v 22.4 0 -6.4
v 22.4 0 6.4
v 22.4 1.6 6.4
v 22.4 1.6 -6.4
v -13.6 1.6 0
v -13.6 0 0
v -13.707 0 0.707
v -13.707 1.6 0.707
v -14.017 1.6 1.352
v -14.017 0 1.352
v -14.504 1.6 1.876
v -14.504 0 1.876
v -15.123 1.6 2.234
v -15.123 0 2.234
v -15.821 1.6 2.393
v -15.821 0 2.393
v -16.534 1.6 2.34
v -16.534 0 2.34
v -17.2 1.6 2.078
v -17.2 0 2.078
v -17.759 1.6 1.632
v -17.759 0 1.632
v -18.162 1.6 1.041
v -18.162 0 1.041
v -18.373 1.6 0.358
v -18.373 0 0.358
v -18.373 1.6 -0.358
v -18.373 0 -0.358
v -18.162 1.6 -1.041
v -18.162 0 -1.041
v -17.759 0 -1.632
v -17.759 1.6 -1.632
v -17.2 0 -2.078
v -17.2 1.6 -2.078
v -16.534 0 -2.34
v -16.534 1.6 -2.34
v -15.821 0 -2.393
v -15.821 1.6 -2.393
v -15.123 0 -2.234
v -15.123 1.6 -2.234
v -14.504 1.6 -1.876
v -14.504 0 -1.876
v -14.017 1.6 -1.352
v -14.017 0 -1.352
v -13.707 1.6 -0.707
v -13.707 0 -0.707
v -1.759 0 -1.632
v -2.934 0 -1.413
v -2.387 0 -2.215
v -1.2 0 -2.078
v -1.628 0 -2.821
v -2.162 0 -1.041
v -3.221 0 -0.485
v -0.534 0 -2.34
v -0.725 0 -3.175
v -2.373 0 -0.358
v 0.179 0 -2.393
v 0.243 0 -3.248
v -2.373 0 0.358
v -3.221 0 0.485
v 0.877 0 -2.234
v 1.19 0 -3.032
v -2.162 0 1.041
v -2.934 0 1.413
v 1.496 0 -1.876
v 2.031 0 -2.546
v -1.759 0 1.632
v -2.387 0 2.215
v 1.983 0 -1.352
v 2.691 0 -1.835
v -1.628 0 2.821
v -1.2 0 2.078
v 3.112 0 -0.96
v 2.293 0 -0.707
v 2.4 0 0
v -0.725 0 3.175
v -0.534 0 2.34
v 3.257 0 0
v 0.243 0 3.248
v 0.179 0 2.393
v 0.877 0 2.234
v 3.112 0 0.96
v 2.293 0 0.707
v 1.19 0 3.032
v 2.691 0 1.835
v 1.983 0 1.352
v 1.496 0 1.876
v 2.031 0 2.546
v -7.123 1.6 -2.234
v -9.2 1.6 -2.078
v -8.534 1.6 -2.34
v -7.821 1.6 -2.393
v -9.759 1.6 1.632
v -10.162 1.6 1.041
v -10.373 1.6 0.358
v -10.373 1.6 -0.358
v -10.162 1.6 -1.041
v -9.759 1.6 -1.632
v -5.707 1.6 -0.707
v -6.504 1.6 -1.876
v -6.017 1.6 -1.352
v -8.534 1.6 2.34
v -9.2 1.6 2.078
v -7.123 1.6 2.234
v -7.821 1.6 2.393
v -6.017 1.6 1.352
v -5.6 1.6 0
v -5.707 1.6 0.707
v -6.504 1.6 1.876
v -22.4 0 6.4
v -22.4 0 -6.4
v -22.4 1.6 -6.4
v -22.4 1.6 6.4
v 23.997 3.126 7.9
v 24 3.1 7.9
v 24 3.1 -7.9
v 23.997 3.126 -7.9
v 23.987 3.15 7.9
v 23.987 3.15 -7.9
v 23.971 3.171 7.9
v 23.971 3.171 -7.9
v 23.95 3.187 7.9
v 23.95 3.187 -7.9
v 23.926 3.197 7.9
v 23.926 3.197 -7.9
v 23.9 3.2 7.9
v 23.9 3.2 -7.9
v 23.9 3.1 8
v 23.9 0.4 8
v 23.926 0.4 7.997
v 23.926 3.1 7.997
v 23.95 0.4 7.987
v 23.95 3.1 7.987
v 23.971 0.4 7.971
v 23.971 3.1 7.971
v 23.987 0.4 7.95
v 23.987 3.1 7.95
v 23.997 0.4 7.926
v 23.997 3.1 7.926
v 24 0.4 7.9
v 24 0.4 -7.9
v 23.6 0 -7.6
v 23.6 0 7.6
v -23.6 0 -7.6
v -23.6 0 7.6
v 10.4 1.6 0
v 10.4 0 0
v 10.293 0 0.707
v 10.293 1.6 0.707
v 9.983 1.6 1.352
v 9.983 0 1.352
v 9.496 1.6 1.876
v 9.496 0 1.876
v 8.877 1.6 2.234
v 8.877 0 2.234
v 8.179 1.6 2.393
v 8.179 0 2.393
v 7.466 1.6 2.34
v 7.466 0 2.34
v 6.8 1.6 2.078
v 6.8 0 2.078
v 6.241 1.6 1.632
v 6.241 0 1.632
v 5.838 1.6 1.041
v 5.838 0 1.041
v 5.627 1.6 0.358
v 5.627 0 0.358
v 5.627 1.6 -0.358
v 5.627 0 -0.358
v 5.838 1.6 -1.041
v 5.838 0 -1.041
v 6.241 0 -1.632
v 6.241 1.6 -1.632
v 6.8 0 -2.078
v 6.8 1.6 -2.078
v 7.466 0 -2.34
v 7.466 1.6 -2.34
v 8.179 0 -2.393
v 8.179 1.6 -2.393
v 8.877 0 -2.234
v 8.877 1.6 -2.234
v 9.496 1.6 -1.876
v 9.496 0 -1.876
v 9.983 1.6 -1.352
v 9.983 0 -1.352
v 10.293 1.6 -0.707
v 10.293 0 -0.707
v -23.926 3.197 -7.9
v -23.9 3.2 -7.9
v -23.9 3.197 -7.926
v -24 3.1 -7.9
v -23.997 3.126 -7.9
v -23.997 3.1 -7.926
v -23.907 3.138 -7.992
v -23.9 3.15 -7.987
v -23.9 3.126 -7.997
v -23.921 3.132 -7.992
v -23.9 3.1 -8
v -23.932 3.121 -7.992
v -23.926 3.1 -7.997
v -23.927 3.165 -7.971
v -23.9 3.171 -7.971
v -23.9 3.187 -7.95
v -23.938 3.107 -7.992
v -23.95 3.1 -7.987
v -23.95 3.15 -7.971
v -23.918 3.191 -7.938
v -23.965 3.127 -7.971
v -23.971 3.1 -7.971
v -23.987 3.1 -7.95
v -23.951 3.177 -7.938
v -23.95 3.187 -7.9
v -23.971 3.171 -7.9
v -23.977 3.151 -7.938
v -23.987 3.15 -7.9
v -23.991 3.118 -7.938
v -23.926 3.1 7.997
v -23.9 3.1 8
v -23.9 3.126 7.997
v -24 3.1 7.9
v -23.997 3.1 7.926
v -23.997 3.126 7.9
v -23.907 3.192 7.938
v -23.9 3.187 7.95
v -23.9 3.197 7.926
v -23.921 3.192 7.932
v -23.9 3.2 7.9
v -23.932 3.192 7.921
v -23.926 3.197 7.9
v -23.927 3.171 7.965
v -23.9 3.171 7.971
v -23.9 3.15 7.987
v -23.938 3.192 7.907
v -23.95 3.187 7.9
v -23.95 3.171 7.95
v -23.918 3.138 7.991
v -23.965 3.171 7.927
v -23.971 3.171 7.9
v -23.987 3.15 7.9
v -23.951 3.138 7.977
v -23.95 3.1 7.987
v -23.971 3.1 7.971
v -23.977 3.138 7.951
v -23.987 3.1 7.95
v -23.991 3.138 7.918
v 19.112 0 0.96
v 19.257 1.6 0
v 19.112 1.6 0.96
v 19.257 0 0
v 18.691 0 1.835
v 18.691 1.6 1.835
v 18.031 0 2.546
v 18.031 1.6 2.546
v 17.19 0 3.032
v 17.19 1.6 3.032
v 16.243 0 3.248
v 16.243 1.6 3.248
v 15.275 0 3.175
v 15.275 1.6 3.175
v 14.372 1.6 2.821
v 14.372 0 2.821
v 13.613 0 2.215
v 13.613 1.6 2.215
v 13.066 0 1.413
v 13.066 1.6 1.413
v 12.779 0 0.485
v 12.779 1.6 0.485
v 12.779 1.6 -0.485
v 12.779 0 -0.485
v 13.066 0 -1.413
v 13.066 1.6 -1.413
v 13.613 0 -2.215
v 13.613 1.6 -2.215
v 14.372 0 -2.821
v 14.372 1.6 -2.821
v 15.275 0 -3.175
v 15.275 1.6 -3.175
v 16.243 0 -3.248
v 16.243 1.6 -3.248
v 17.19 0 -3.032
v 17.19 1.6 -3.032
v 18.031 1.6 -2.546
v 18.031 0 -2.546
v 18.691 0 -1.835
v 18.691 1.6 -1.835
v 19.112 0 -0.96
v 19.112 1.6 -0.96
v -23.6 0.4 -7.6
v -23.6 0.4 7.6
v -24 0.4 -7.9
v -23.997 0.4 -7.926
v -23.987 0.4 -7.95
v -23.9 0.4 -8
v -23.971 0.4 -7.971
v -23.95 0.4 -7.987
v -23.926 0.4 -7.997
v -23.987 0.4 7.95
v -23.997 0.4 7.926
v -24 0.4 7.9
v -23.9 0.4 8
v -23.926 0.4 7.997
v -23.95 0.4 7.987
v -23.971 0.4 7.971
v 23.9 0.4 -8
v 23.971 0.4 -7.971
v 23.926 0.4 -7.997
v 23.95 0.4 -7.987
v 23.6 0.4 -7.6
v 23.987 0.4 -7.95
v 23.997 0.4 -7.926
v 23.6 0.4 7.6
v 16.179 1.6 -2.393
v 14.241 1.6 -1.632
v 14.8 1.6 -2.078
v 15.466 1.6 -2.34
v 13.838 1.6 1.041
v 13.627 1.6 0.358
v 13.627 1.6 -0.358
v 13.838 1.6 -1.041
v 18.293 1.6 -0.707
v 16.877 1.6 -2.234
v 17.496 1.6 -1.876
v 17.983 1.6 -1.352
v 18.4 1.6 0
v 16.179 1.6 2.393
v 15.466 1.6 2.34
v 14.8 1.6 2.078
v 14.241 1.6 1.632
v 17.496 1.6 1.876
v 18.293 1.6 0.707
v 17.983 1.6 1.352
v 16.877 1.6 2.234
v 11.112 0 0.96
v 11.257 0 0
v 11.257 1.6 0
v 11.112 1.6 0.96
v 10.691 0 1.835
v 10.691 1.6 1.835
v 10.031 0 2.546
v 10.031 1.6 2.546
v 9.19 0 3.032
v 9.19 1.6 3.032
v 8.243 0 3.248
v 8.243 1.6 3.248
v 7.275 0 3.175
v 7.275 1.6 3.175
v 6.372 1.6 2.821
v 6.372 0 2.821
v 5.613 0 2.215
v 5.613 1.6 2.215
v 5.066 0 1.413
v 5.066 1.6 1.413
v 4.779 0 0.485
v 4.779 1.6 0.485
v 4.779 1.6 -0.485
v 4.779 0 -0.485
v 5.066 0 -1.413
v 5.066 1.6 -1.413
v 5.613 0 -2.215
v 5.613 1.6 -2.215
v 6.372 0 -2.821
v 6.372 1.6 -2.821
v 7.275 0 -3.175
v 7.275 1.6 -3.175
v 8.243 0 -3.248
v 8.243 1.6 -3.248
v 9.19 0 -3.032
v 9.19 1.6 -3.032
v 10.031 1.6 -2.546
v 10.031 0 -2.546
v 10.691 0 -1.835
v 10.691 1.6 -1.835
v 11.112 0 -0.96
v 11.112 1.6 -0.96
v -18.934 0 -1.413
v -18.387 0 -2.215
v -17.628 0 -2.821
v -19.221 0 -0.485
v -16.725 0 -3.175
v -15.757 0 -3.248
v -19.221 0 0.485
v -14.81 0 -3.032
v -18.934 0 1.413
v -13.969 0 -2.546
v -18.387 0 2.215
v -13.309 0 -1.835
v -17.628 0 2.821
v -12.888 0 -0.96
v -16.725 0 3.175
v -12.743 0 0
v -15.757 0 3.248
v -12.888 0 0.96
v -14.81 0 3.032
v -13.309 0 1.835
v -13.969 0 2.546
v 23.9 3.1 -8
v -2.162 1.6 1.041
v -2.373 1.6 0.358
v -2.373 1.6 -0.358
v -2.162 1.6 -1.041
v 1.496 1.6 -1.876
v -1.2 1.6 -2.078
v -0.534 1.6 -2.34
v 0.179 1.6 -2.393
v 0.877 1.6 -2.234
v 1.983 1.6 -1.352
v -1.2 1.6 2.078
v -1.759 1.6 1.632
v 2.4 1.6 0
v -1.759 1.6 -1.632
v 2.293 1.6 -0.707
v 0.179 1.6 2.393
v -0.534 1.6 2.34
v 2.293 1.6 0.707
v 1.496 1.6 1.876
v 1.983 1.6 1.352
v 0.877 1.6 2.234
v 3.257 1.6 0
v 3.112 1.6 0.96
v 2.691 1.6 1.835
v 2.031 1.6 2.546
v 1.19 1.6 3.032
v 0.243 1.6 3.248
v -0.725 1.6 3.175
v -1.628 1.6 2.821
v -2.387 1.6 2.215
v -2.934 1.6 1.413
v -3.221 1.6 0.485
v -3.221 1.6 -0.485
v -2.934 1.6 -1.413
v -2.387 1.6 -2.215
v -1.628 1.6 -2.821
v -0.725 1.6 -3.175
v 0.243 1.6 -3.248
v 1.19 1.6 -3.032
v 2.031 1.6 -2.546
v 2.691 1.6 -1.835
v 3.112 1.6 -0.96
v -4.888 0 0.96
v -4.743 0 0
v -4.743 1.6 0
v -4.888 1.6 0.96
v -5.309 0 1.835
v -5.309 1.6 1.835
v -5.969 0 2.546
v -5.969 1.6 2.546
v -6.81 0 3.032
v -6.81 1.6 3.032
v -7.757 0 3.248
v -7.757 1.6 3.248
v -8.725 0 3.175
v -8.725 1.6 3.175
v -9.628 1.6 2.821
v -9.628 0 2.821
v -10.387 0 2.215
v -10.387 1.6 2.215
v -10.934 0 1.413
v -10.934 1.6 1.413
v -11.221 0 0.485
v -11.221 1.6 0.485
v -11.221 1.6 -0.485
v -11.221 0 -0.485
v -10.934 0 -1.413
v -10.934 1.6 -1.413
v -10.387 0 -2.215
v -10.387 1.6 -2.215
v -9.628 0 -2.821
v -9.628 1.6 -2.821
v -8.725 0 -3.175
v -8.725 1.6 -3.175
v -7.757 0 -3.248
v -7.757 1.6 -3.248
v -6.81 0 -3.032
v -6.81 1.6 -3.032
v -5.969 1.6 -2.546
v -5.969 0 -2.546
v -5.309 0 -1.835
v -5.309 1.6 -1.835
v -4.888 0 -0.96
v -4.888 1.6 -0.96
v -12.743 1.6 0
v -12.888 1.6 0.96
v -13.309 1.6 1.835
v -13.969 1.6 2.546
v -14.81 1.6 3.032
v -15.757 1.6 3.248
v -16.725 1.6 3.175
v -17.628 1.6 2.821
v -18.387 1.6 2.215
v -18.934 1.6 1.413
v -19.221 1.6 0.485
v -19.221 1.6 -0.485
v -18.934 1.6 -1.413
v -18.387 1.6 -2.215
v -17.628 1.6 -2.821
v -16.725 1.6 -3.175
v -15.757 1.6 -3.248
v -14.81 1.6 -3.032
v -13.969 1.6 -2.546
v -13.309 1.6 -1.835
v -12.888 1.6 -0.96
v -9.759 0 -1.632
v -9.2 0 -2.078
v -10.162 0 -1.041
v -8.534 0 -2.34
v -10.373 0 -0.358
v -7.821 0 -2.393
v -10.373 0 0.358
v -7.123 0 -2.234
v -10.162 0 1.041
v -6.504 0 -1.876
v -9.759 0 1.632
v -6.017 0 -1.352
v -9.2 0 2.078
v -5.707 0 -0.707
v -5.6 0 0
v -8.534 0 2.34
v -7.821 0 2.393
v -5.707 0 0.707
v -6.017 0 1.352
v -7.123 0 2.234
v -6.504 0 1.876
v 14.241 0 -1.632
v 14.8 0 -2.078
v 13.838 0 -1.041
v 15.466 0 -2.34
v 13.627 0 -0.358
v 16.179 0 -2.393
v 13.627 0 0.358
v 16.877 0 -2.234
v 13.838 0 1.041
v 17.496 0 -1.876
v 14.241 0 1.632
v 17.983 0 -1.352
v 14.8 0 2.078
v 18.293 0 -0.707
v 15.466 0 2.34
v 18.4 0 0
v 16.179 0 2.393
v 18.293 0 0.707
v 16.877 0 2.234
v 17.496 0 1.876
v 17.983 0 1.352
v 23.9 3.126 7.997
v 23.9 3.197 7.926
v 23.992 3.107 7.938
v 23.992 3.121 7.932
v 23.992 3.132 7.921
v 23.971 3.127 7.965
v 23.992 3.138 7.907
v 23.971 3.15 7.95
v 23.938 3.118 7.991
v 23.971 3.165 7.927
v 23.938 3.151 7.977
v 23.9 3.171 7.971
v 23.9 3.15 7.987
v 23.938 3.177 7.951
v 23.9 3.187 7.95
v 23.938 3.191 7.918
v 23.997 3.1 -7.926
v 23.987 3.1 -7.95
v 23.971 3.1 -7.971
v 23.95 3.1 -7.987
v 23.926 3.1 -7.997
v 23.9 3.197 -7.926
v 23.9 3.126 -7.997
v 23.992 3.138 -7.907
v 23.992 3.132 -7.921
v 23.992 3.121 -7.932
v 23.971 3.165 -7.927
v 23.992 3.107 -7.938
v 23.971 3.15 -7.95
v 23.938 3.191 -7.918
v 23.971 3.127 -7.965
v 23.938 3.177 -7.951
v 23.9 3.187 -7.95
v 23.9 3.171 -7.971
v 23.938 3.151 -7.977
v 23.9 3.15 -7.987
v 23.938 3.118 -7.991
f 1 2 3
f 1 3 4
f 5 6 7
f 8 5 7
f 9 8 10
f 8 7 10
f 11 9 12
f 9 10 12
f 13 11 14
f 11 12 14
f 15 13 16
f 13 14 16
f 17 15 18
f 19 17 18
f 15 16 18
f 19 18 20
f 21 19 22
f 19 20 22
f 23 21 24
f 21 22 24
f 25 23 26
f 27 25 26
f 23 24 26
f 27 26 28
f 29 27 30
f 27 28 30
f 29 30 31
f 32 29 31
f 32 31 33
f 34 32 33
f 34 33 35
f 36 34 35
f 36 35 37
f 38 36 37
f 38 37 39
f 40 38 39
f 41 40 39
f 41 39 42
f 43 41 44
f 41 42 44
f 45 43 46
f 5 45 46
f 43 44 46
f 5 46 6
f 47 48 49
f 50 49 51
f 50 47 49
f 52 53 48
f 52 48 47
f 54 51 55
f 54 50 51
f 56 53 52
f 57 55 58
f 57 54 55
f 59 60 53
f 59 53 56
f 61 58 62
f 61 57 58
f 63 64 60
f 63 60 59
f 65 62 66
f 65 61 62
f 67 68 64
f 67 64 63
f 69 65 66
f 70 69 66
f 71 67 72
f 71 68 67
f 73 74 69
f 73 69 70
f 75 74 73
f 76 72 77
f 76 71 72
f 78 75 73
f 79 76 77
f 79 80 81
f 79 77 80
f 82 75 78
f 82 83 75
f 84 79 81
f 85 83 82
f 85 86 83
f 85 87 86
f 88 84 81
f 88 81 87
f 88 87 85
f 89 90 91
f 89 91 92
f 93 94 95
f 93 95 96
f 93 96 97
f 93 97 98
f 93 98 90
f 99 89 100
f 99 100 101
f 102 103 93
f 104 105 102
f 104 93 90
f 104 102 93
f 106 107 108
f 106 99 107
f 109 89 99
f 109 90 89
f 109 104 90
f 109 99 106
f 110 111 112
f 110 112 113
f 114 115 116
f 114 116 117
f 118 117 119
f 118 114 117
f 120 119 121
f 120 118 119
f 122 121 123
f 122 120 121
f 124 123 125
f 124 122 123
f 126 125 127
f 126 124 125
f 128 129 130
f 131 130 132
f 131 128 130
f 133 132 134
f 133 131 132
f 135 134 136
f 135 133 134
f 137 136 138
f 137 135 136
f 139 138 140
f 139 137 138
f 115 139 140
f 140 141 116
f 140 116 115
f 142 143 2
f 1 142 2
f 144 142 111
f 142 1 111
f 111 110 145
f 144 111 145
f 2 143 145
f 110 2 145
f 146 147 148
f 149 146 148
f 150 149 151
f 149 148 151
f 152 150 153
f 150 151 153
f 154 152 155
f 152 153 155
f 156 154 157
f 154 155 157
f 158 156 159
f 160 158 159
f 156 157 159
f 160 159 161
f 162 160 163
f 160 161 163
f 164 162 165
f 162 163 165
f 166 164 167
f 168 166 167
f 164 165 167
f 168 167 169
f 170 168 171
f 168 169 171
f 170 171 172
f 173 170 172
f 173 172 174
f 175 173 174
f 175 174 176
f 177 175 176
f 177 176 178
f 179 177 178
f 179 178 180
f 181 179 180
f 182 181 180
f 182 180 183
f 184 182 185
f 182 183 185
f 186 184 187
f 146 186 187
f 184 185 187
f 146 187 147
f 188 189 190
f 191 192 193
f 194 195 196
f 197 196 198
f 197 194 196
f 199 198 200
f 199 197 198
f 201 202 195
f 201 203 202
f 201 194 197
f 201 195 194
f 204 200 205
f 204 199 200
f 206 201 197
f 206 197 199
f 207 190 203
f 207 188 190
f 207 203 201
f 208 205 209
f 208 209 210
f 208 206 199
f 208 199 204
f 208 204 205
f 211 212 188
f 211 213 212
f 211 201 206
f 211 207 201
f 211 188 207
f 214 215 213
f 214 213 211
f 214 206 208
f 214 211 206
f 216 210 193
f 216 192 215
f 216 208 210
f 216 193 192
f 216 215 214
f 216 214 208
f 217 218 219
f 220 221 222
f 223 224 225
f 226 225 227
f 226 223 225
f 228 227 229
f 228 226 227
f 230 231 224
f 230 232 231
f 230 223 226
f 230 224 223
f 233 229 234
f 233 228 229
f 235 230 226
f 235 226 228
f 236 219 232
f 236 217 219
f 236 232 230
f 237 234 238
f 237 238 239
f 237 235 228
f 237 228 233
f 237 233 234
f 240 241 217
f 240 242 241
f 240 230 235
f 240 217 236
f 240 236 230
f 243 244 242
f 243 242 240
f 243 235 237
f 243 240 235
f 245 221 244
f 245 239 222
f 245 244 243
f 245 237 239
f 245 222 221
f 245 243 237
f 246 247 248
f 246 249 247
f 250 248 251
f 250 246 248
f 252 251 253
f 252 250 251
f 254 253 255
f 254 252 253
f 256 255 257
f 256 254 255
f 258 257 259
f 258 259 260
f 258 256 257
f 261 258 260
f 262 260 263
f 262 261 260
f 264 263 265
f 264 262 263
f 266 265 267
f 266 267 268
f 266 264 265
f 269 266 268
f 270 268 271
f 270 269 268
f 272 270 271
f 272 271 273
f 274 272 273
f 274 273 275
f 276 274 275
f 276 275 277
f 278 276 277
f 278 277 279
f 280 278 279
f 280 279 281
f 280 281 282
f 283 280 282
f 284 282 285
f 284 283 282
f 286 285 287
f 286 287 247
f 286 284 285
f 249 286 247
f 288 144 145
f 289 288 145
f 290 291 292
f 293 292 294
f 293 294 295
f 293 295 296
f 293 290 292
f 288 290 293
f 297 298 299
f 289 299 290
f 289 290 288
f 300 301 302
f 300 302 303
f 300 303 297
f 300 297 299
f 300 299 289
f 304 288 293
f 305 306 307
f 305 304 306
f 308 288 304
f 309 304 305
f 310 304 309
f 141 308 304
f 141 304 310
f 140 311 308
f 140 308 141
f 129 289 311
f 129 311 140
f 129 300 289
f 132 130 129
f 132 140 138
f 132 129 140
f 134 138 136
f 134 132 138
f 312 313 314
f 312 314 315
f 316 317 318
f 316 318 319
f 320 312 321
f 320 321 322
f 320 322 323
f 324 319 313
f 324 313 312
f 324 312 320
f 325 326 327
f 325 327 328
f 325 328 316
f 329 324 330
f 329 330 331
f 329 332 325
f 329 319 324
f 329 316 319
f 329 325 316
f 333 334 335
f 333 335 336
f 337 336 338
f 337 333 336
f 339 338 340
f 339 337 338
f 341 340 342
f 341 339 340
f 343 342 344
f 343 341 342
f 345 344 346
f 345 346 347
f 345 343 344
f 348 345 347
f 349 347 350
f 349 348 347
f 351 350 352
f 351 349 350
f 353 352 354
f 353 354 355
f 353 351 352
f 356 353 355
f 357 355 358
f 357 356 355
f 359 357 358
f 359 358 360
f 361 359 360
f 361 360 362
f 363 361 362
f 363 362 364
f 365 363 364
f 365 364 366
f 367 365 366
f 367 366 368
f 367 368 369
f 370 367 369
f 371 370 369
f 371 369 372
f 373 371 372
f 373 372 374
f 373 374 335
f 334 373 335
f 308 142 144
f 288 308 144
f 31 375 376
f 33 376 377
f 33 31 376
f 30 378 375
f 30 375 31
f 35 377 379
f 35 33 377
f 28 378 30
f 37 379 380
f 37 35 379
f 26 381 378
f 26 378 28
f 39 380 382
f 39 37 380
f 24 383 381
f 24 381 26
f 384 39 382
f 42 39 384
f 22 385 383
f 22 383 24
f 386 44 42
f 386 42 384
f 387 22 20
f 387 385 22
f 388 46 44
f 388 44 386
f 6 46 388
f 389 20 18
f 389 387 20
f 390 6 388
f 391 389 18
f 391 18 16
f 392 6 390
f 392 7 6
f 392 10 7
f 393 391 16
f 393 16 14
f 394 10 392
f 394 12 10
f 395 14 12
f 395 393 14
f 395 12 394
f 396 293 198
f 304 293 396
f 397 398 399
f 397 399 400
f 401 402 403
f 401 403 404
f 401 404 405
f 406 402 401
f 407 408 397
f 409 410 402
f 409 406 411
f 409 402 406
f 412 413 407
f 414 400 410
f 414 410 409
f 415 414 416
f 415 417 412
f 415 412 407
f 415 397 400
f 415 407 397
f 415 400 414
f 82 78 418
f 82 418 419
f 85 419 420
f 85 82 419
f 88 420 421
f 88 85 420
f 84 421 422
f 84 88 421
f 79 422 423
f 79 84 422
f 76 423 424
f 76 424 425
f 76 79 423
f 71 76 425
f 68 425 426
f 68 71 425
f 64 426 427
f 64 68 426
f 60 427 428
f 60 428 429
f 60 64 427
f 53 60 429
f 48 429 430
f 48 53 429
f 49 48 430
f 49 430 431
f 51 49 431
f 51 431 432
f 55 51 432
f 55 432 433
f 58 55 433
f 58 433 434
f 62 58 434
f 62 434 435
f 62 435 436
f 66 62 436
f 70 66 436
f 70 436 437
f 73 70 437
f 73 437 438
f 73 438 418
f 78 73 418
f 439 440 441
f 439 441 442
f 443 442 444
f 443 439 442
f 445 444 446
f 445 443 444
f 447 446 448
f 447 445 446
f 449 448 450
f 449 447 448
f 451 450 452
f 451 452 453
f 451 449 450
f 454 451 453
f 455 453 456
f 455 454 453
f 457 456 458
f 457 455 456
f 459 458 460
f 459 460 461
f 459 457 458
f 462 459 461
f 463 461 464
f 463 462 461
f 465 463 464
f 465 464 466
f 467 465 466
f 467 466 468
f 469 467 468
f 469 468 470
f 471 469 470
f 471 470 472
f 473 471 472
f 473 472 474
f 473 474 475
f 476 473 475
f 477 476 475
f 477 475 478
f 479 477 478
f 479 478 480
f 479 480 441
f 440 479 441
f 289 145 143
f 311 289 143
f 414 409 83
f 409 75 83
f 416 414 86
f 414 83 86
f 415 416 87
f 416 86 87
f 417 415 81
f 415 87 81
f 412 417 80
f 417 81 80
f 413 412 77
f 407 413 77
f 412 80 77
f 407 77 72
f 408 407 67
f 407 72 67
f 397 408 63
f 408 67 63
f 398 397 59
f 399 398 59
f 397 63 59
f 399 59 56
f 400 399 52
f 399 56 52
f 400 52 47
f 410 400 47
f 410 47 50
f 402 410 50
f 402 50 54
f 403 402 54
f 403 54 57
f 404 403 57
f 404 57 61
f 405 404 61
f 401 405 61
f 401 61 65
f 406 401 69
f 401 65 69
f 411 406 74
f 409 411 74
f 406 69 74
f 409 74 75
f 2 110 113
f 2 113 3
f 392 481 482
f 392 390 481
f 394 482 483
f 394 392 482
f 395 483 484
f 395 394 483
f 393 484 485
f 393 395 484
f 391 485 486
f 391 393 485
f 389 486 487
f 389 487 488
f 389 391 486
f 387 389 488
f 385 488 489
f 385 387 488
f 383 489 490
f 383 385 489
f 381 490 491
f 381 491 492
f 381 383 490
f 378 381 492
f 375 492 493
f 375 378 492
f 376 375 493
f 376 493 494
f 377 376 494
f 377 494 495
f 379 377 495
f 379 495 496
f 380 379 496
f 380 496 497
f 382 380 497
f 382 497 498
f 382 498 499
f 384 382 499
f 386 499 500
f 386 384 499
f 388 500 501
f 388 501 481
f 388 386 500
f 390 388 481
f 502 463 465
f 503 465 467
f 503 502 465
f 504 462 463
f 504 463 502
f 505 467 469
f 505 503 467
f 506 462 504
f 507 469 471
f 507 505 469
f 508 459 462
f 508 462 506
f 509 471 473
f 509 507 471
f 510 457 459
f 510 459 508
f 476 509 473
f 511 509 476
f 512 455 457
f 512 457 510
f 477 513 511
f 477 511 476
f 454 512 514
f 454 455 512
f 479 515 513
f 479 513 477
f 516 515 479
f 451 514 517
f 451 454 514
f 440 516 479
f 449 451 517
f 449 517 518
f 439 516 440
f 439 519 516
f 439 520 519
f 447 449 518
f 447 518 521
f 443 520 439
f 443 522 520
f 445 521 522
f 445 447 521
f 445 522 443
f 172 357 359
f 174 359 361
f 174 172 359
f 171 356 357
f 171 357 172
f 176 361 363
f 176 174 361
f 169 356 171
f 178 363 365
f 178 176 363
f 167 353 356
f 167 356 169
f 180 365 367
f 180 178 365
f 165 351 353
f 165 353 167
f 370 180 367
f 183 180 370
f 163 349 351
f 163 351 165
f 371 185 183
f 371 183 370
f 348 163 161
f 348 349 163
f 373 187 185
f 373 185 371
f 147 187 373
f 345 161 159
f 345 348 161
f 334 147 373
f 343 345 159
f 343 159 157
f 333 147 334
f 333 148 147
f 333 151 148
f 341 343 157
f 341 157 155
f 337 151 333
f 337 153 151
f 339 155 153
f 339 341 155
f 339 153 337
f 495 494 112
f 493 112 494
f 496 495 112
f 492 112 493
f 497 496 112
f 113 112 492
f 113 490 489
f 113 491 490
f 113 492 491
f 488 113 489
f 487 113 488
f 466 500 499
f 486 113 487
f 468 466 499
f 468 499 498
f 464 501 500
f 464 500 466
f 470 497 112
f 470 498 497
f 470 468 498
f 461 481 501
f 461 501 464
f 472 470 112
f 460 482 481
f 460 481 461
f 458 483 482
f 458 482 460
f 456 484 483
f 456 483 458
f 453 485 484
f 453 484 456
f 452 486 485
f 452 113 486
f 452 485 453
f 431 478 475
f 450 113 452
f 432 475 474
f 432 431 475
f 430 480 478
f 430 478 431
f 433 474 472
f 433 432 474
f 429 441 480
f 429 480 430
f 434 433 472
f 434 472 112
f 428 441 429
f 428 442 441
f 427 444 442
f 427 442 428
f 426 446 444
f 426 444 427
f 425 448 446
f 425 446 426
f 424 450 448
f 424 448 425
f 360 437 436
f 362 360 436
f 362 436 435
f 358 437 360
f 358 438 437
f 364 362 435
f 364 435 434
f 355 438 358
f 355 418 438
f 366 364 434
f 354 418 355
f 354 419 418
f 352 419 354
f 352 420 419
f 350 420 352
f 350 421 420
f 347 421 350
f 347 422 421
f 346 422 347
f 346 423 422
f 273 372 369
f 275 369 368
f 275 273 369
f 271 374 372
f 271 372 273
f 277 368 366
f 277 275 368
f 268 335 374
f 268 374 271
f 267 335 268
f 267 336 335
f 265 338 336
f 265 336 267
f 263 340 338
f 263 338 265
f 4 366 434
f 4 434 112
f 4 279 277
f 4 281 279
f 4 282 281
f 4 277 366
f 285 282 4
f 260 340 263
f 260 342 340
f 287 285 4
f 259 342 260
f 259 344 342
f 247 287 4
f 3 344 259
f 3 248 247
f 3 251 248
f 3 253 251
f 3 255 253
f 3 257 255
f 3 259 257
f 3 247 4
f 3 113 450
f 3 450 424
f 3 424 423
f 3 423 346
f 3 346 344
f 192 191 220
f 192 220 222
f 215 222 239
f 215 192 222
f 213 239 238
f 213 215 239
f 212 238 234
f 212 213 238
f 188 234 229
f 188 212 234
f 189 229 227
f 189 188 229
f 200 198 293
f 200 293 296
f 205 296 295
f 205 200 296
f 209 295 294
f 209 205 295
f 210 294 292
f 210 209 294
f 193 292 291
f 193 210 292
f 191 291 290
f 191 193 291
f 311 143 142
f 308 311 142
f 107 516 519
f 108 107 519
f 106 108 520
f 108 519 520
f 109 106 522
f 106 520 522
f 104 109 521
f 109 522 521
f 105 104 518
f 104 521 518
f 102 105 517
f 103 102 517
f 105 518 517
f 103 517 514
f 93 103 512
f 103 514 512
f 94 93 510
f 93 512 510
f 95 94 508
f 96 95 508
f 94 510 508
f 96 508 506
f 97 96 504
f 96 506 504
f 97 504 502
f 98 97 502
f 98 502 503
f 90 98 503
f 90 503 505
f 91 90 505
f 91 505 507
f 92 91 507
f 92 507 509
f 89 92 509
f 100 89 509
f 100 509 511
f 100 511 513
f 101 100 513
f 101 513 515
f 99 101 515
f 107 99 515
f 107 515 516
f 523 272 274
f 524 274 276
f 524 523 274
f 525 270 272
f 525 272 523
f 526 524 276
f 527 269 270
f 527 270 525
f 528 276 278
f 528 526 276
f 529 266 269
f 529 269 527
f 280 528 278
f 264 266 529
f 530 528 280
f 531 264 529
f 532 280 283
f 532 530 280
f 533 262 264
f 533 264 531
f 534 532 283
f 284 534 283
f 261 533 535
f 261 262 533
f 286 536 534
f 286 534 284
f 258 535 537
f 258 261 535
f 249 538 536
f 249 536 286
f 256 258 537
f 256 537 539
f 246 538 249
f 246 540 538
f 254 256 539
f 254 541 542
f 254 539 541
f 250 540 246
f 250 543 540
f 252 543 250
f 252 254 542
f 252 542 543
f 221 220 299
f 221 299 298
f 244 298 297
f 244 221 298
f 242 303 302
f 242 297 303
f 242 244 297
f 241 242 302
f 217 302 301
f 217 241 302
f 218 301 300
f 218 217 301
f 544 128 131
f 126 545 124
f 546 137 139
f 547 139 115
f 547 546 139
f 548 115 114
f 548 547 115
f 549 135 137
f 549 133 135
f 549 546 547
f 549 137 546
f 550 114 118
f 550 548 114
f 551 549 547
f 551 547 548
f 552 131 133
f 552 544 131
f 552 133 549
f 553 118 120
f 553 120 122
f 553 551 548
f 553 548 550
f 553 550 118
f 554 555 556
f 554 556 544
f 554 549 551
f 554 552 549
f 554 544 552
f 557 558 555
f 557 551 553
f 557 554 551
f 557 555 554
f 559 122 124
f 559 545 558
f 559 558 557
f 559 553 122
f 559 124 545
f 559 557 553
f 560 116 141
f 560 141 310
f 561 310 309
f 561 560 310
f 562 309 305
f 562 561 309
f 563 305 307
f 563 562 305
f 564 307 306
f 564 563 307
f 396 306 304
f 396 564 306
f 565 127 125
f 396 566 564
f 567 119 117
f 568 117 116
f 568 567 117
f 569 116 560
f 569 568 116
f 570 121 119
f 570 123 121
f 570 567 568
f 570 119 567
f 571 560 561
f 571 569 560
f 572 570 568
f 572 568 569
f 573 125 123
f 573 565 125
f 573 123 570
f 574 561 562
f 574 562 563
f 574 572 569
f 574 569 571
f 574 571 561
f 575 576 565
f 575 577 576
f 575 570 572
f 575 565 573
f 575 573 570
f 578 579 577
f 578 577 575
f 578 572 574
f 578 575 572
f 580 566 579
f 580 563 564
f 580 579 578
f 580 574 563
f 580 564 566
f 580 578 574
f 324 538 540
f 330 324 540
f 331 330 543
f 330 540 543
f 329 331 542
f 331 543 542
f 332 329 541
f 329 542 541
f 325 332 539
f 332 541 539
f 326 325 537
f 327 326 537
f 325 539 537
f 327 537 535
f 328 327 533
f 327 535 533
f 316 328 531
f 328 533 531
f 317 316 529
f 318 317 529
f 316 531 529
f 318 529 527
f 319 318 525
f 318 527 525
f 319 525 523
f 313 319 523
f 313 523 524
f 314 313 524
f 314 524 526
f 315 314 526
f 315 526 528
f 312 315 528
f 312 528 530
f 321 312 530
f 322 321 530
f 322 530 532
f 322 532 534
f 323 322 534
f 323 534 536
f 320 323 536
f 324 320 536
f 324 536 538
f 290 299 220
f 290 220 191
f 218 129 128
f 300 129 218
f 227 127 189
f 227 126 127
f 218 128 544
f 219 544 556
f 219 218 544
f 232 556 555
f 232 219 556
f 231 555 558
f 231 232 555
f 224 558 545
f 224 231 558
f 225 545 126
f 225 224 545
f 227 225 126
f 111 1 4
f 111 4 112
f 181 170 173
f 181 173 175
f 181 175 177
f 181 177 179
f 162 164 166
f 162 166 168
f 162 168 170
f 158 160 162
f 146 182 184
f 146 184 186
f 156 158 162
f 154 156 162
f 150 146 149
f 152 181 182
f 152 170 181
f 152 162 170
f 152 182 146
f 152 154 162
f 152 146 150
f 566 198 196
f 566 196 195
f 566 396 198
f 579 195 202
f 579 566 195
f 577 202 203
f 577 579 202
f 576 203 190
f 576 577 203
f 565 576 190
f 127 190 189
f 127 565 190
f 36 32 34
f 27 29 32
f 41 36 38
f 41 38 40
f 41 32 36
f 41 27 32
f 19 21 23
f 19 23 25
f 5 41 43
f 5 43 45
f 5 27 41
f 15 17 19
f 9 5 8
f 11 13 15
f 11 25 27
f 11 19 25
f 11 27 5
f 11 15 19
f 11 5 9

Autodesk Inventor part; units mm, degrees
ref_plane "YZ Plane" through (0, 0, 0) normal (1, 0, 0) x (0, 1, 0)
ref_plane "XZ Plane" through (0, 0, 0) normal (0, 1, 0) x (-1, 0, 0)
ref_plane "XY Plane" through (0, 0, 0) normal (0, 0, 1) x (1, 0, 0)
sketch "Sketch2" plane through (0, 0, 0) normal (0, 1, 0) x (-1, 0, 0)
  line L0 (-24, 8) -> (24, 8)
  line L1 (24, 8) -> (24, -8)
  line L2 (24, -8) -> (-24, -8)
  line L3 (-24, -8) -> (-24, 8)
  point P0 (0, 0)
  point P1 (0, 8)
  point P2 (-24, 0)
  dimension "d0" = 48
  dimension "d1" = 16
extrude "Extrusion1" add sketch "Sketch2" along normal blind 3.2
sketch "Sketch3" plane through (0, 0, 0) normal (0, -1, 0) x (1, 0, 0)
  line L0 (-24, 8) -> (-24, -8) projected
  line L1 (-22.4, 6.4) -> (22.4, 6.4)
  line L2 (22.4, 6.4) -> (22.4, -6.4)
  line L3 (22.4, -6.4) -> (-22.4, -6.4)
  line L4 (-22.4, -6.4) -> (-22.4, 6.4)
  circle A0 centre (-16, 0) radius 3.2569
  circle A1 centre (-16, 0) radius 2.4
  line L5 (-24, -8) -> (24, -8) projected
  circle A2 centre (0, 0) radius 1.6
  line L6 (24, -8) -> (24, 8) projected
  line L7 (-12, 0) -> (-4, 0) construction
  line L8 (-4, 0) -> (4, 0) construction
  line L9 (4, 0) -> (12, 0) construction
  circle A3 centre (-20, 4) radius 2.4 construction
  circle A4 centre (-20, -4) radius 2.4 construction
  circle A5 centre (20, -4) radius 2.4 construction
  circle A6 centre (20, 4) radius 2.4 construction
  line L10 (24, 8) -> (-24, 8) projected
  line L11 (-23.6, 7.6) -> (23.6, 7.6)
  line L12 (23.6, 7.6) -> (23.6, -7.6)
  line L13 (23.6, -7.6) -> (-23.6, -7.6)
  line L14 (-23.6, -7.6) -> (-23.6, 7.6)
  point P0 (-22.4, 0)
  point P1 (0, 6.4)
  point P2 (0, 0)
  point P3 (0, 7.6)
  point P4 (-23.6, 0)
  dimension "d61" = 4.8
  dimension "d75" = 8
  dimension "d76" = 8
  dimension "d86" = 3.2
  dimension "d92" = 8
  dimension "d98" = 40
  dimension "d99" = 8
  dimension "d102" = 0.4
  dimension "d103" = 0.4
extrude "Extrusion2" cut sketch "Sketch3" against normal blind 1.6 contours L1 L2 L3 L4 | A0 | A1 | A2
extrude "Extrusion7" cut sketch "Sketch3" against normal blind 0.4 contours L10 L6 L5 L0
extrude "Extrusion6" add sketch "Sketch3" against normal up to next contours A0
pattern_linear "Rectangular Pattern3" count 5 spacing 8 along (1, 0, 0) of "Extrusion6"
fillet "Fillet1" radius 0.1 8 edges at (-24, 1.8, 8) (0, 3.2, 8) (-24, 3.2, 0) (0, 3.2, -8) (24, 3.2, 0) (24, 1.8, 8) (24, 1.8, -8) (-24, 1.8, -8)
sketch "Skizze10" plane through (0, 3.2, 0) normal (0, 1, 0) x (1, 0, 0)
  line L0 (-21.913, 4.8) -> (21.913, 4.8) construction
  line L1 (21.913, 4.8) -> (21.913, -4.8) construction
  line L2 (21.913, -4.8) -> (-21.913, -4.8) construction
  line L3 (-21.913, -4.8) -> (-21.913, 4.8) construction
  line L4 (23.9, 8) -> (-23.9, 8) projected
  line L5 (-23.9, -8) -> (23.9, -8) projected
  point P0 (0, 0)
  point P1 (0, 4.8)
  point P2 (0, 8)
  dimension "d107" = 3.2
  dimension "d110" = 3.2
decal "Aufkleber1"
equation "\"d4\" = 0.333333 * lh"
equation "\"d61\" = kd"
equation "\"d75\" = lu"
equation "\"d76\" = d75"
equation "\"d86\" = pd"
equation "\"d92\" = lu"
equation "\"d98\" = 5 * lu"
equation "\"d99\" = d75"
equation "\"d102\" = gw"
equation "\"d103\" = gw"
equation "\"d11\" = 0.333333 * lh - topthk"
equation "\"d104\" = gh"
equation "\"d91\" = lu"
equation "\"d110\" = d107"
equation "\"lh\" = 9.6"
equation "\"kd\" = 4.8"
equation "\"lu\" = 8"
equation "\"pd\" = 3.2"
equation "\"gw\" = 0.4"
equation "\"topthk\" = 1.6"
equation "\"gh\" = 0.4"
properties part number "69729-DkBluishGray" material "ABS Plastic"
